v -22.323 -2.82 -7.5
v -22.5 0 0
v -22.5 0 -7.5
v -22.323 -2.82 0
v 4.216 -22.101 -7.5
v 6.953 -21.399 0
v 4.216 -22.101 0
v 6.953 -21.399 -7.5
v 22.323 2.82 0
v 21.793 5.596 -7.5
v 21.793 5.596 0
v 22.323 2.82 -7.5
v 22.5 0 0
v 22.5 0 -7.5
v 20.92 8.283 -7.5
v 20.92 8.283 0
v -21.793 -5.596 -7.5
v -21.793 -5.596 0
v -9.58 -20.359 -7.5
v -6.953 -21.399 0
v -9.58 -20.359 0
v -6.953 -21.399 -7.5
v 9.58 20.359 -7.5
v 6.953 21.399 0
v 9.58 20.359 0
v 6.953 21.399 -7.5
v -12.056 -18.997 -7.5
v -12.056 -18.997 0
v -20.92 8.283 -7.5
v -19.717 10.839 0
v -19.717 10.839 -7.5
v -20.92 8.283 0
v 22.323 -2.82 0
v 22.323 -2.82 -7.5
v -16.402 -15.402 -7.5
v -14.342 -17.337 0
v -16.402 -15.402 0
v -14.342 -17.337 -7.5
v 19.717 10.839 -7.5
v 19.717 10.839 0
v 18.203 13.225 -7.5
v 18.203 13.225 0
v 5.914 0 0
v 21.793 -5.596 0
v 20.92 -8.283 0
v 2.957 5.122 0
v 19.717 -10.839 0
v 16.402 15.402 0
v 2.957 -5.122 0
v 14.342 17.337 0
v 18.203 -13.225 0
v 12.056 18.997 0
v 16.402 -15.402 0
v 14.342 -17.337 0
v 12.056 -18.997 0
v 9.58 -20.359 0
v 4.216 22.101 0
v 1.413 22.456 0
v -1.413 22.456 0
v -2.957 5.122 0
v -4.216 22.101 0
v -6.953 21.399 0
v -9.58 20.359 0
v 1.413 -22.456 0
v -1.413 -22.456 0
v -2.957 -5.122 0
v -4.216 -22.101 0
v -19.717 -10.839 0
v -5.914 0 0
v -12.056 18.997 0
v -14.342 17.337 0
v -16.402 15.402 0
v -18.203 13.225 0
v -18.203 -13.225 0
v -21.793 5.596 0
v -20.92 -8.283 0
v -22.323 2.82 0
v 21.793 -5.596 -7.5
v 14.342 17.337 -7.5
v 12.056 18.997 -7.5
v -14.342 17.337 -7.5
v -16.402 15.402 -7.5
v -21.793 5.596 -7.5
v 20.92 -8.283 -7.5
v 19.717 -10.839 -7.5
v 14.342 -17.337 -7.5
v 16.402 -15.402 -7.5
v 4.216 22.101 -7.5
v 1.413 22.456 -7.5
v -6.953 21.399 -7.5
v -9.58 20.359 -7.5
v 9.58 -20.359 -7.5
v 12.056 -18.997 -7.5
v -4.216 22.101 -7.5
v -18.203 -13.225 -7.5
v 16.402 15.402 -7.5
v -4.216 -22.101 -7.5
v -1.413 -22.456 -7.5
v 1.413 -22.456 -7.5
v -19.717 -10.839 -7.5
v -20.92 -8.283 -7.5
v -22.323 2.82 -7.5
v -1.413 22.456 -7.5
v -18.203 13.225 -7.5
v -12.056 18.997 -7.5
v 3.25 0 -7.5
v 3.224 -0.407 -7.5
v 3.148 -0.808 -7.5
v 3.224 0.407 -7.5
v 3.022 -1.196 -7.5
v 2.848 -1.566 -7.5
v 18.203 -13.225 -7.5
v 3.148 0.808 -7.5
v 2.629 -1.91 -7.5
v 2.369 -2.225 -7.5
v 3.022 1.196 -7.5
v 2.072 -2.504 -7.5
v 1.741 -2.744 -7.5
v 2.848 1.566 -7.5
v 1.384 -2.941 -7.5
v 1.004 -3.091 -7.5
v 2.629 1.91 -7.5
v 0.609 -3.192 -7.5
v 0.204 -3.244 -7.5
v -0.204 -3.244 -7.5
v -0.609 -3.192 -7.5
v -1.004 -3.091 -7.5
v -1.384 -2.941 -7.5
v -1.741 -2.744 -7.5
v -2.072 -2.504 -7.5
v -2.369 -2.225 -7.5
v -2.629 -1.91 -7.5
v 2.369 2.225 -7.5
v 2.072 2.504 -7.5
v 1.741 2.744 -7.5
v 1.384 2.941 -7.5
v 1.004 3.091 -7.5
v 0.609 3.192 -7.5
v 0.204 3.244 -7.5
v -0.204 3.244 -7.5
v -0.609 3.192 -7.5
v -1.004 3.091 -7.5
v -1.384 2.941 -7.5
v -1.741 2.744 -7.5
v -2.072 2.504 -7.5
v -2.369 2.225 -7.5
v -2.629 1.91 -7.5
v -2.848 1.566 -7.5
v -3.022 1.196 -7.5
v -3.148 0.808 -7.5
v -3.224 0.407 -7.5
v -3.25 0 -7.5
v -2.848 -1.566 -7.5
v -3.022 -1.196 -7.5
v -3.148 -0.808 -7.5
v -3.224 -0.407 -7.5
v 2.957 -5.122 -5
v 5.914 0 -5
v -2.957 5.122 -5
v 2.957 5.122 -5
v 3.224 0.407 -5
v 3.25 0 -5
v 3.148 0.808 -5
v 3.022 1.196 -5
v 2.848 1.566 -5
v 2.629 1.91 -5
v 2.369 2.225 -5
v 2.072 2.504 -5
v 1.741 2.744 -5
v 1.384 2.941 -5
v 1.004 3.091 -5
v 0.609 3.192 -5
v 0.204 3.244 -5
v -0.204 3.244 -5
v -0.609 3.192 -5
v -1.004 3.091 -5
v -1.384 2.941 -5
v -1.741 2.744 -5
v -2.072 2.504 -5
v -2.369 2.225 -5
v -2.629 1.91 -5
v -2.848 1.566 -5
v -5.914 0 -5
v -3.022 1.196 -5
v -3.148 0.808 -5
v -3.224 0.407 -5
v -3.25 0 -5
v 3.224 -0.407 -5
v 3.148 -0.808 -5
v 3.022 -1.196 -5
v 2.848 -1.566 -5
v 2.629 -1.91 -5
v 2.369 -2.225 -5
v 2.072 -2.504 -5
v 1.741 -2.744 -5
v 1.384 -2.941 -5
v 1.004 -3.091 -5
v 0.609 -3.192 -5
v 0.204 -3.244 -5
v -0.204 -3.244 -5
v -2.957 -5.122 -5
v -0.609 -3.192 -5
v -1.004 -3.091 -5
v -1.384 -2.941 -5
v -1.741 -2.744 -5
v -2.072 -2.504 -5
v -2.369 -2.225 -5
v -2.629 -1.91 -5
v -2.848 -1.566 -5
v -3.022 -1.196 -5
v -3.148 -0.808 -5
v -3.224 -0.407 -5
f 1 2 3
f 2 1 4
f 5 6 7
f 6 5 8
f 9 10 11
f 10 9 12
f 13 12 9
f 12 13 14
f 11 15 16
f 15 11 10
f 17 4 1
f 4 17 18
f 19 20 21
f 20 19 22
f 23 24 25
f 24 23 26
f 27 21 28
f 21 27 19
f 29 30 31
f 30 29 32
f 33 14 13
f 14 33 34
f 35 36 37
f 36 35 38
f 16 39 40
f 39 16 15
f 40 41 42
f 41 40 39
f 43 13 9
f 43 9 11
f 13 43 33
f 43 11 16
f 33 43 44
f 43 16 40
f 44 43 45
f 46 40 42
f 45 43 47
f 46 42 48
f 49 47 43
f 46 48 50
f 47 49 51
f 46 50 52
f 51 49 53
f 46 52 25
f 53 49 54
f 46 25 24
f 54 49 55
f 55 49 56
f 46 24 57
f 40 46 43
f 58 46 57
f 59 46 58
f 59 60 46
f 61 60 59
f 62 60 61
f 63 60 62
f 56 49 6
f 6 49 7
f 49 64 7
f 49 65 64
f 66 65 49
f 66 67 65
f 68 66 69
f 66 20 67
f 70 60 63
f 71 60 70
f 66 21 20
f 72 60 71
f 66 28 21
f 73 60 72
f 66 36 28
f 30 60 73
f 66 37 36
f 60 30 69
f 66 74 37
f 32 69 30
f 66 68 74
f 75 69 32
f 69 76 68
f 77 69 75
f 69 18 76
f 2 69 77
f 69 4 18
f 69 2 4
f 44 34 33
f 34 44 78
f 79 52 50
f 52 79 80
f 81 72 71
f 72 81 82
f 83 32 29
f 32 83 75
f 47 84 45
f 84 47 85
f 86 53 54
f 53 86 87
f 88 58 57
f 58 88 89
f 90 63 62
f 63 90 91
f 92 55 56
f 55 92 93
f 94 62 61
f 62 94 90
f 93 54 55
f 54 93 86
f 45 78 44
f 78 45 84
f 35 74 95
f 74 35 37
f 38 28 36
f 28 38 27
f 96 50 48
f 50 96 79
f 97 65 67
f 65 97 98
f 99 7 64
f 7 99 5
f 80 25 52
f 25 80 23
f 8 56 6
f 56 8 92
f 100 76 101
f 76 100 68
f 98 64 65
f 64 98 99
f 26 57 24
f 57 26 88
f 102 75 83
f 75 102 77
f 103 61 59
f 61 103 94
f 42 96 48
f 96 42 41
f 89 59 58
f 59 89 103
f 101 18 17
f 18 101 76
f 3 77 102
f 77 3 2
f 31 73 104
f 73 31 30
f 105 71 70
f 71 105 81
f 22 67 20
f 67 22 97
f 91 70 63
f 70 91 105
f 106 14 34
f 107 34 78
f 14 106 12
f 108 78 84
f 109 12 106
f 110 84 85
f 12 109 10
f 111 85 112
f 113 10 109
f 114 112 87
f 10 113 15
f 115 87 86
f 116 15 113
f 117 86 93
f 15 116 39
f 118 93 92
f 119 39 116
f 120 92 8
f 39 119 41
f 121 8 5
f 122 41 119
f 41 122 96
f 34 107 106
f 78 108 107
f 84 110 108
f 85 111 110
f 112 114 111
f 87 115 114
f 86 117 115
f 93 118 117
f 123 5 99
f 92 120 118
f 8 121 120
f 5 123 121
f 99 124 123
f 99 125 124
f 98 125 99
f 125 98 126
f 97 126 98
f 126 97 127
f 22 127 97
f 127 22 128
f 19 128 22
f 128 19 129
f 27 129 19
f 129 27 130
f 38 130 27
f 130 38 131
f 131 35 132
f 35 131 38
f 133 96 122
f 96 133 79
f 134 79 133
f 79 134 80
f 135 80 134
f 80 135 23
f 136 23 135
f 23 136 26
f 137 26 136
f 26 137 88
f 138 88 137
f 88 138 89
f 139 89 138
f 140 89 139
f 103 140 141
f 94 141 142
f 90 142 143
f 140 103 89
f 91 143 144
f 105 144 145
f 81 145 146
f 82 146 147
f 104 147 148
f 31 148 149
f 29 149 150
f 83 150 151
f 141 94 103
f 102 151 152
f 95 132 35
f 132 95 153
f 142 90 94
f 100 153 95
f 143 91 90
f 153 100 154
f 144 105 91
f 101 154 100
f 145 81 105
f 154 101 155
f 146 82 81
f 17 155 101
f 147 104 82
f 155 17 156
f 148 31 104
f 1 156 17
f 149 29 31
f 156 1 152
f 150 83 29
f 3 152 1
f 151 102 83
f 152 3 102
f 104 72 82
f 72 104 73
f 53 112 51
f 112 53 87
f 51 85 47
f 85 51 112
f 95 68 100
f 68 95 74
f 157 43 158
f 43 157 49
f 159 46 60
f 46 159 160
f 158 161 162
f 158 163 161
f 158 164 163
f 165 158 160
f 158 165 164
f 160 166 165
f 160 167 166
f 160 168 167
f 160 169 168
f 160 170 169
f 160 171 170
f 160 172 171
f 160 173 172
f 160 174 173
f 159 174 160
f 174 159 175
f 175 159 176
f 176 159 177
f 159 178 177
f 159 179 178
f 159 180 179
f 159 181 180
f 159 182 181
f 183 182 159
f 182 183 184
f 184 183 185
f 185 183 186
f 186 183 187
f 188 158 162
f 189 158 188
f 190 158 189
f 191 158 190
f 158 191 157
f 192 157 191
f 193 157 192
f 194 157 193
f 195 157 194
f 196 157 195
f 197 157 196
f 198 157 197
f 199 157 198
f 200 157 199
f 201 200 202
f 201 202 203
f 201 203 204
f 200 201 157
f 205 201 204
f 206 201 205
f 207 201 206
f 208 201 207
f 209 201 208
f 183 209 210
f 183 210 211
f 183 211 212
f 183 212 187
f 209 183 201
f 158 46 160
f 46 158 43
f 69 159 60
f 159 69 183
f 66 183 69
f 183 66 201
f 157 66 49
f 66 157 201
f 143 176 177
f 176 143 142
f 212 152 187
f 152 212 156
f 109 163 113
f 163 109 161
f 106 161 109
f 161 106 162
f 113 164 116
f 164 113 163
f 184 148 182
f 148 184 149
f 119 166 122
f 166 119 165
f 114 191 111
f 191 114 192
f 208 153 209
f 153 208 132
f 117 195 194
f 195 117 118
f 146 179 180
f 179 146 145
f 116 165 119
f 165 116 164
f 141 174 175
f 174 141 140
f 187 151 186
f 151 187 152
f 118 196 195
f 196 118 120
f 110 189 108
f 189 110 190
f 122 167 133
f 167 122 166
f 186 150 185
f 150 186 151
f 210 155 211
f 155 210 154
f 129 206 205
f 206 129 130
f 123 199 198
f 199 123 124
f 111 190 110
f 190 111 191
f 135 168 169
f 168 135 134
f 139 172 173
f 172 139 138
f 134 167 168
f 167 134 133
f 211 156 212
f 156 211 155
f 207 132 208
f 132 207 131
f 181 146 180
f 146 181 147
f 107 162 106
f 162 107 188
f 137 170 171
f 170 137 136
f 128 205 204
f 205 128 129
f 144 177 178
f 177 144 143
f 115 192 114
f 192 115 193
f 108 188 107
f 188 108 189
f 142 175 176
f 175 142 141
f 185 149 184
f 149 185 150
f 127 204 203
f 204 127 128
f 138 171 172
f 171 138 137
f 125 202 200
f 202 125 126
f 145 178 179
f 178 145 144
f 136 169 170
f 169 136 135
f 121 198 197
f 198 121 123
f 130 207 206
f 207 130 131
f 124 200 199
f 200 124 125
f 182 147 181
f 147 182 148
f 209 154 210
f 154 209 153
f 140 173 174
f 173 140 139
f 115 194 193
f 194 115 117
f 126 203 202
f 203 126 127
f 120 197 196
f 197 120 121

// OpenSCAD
$fn = 50;


difference() {
	union() {
		translate(v = [0, 0, -7.5000000000]) {
			cylinder(h = 7.5000000000, r = 22.5000000000);
		}
		translate(v = [0, 0, -6.0000000000]) {
			cylinder(h = 6, r = 2.8750000000);
		}
	}
	union() {
		translate(v = [0, 0, 0]) {
			rotate(a = [0, 0, 0]) {
				difference() {
					union() {
						translate(v = [0, 0, -5]) {
							linear_extrude(height = 5) {
								polygon(points = [[5.9142500000, 0.0000000000], [2.9571250000, 5.1218907443], [-2.9571250000, 5.1218907443], [-5.9142500000, 0.0000000000], [-2.9571250000, -5.1218907443], [2.9571250000, -5.1218907443]]);
							}
						}
					}
					union();
				}
			}
		}
		#translate(v = [0, 0, -100.0000000000]) {
			cylinder(h = 200, r = 3.2500000000);
		}
	}
}
